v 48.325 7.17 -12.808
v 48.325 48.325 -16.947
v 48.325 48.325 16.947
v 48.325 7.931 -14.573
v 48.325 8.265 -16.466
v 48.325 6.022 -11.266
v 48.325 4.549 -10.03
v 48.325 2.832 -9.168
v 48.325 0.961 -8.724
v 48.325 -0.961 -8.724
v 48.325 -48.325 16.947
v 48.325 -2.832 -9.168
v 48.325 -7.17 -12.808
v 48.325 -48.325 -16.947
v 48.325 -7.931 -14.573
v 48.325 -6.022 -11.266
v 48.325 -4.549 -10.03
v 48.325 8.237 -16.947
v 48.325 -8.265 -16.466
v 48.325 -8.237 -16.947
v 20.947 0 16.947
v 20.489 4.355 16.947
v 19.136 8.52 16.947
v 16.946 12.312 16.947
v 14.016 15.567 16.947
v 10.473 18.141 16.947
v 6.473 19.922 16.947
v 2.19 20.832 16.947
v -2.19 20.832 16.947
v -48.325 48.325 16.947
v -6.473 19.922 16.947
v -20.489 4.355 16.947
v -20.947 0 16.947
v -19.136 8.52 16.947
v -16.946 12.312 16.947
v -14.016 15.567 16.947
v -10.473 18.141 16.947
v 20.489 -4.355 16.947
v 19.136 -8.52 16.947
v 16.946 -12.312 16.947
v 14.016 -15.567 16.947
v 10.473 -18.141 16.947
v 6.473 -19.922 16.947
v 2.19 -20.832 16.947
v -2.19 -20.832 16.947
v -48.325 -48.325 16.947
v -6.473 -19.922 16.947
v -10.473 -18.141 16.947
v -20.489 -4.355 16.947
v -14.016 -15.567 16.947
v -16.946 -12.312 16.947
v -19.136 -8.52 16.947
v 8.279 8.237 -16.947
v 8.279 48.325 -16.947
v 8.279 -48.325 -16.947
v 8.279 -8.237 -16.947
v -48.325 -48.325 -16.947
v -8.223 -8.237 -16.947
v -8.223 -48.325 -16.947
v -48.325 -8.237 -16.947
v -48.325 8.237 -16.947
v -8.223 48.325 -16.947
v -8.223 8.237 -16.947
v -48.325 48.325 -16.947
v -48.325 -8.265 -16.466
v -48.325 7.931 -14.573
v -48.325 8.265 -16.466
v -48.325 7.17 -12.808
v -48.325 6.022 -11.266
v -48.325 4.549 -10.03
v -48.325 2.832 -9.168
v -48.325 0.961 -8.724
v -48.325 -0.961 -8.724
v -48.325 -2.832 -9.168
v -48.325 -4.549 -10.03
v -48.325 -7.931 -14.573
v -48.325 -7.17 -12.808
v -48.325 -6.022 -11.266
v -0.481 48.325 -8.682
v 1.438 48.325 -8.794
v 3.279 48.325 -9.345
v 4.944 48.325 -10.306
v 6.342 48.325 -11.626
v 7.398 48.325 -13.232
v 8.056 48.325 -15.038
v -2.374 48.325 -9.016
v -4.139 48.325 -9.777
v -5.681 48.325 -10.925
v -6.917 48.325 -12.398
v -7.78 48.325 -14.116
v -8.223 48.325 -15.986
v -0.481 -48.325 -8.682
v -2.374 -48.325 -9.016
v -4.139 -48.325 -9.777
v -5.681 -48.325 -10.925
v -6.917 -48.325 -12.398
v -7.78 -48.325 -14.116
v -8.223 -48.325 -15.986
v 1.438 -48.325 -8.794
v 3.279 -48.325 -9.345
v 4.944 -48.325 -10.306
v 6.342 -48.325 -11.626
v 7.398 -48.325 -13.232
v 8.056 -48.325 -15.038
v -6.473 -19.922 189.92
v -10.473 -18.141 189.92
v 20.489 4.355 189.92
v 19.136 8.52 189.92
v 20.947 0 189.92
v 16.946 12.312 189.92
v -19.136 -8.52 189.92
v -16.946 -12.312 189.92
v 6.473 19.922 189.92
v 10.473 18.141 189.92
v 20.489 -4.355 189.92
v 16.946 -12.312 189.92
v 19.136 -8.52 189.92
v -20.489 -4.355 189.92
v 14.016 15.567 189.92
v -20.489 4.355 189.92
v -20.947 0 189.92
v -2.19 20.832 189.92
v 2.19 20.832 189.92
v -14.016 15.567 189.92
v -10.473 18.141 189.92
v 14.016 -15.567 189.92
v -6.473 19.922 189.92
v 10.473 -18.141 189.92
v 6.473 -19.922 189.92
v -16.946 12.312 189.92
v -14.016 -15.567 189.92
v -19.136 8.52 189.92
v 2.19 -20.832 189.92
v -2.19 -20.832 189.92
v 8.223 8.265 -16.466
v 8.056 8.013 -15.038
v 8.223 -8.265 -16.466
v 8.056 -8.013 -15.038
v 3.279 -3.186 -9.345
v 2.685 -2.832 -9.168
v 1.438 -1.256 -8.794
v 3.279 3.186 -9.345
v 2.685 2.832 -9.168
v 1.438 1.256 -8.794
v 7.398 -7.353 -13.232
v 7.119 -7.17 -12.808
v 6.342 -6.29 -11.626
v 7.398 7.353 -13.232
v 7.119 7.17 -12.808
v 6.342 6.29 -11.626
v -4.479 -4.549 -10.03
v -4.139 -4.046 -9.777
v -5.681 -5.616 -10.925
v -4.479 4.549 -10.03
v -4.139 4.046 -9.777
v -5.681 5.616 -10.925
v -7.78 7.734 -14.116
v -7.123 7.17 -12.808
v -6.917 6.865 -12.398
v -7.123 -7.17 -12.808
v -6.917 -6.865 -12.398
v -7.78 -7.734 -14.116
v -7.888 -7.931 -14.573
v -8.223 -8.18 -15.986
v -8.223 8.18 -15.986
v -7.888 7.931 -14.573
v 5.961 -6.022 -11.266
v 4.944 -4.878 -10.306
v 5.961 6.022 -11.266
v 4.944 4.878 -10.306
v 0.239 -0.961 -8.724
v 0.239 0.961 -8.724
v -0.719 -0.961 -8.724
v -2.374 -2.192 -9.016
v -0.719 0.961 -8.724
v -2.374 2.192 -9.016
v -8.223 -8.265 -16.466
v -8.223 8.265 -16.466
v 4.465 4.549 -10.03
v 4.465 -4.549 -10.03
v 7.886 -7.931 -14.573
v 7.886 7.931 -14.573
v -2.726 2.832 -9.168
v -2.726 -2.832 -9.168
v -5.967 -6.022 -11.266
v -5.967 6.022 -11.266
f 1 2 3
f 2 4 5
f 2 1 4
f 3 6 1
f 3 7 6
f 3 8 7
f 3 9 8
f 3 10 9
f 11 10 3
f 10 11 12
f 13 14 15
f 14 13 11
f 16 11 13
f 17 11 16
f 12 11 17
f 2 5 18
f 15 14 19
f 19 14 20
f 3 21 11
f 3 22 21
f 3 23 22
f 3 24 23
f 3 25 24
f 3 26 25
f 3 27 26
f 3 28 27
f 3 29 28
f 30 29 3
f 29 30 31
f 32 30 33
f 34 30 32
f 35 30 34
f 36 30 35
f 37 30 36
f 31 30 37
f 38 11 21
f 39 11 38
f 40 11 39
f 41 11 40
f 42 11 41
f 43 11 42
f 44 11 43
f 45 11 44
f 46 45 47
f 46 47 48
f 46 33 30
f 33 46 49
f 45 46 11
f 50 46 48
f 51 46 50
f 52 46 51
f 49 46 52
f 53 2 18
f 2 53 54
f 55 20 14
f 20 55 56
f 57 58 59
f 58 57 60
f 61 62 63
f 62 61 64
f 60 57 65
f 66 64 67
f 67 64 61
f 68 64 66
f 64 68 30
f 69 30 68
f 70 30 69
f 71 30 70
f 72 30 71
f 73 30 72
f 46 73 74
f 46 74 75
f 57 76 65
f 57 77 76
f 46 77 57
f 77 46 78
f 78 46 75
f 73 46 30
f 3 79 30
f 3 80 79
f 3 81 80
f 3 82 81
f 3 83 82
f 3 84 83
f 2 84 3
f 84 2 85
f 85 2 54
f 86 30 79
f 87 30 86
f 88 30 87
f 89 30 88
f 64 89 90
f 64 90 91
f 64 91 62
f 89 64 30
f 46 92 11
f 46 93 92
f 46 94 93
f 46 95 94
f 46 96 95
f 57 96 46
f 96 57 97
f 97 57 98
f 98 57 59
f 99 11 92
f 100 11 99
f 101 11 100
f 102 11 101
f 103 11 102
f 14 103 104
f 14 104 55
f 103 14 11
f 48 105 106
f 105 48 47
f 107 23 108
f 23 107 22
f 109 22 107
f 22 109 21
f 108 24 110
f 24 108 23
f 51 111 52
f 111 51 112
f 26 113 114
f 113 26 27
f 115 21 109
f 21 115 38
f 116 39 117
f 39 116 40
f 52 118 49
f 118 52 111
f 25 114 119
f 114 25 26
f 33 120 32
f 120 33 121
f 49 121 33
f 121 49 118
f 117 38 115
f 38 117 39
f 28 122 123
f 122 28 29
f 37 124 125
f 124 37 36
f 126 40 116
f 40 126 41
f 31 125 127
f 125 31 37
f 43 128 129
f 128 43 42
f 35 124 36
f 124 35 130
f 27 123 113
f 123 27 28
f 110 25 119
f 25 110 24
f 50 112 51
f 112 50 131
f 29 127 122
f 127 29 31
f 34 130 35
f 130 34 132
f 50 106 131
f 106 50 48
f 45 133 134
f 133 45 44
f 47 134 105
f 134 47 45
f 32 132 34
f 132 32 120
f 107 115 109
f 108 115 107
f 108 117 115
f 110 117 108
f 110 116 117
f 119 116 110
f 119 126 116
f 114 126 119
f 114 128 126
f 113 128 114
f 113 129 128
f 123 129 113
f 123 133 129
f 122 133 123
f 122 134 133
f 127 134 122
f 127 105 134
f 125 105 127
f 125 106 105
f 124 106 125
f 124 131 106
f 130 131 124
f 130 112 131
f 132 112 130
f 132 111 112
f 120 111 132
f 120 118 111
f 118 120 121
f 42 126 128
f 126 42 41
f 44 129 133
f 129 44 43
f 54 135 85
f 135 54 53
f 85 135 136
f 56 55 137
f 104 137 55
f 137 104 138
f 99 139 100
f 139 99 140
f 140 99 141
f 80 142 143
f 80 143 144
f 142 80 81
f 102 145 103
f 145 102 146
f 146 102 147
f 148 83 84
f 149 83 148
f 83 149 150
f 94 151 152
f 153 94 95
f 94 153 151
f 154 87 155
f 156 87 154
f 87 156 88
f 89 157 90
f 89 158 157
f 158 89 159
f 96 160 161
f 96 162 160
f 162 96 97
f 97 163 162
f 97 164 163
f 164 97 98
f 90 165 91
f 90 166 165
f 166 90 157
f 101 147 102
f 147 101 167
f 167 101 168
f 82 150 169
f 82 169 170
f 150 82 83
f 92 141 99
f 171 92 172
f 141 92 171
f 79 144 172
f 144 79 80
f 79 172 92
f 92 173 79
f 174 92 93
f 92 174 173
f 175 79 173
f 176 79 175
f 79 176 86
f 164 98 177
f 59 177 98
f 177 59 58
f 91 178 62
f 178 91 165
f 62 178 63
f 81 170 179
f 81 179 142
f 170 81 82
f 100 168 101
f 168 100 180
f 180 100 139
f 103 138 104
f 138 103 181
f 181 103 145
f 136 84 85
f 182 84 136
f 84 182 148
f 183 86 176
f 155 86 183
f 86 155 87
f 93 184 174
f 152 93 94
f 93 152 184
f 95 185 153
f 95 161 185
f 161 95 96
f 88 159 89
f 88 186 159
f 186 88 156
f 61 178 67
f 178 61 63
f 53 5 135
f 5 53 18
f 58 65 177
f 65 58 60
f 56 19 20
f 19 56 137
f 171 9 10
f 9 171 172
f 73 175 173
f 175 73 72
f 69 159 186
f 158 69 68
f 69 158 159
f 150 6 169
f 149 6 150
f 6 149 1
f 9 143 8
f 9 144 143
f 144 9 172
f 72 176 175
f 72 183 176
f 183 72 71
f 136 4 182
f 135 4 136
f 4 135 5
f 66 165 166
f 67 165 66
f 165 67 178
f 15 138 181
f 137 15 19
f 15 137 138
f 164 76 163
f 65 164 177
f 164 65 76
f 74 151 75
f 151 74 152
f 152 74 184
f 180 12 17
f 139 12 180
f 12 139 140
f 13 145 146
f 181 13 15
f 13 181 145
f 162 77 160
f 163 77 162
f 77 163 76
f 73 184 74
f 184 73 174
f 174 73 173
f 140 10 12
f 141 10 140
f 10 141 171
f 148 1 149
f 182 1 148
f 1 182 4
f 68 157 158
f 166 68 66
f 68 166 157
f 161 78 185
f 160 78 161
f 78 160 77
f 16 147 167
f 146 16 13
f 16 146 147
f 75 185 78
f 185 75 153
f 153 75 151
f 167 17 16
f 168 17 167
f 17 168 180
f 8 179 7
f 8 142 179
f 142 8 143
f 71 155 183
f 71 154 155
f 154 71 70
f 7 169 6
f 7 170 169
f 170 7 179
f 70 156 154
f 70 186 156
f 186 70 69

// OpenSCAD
seed = 9;
seeds = rands(0,1000000,10,seed);
head_size = rands(50,100,1,seeds[1])[0];
head_length = rands(10,40,1,seeds[2])[0];
bolt_length = rands(head_length*2,200,1,seeds[3])[0];
bolt_radius = rands(head_size/5, head_size/3,1,seeds[0])[0];
cylinder_size = rands(head_length/5, head_length/3, 1,seeds[4])[0];

difference(){
    union(){
        cube([head_size,head_size,head_length], center=true);
        cylinder(bolt_length,bolt_radius,bolt_radius);
    }
    translate([0,0,-head_length/2]){ 
        rotate([90, 0, 0]){
            cylinder(head_size, cylinder_size, cylinder_size, center=true);
        }
    }
    
    translate([0,0,-head_length/2]) {
        rotate([0, 90, 0]){
            cylinder(head_size, cylinder_size, cylinder_size, center=true);
        }
    }
}
